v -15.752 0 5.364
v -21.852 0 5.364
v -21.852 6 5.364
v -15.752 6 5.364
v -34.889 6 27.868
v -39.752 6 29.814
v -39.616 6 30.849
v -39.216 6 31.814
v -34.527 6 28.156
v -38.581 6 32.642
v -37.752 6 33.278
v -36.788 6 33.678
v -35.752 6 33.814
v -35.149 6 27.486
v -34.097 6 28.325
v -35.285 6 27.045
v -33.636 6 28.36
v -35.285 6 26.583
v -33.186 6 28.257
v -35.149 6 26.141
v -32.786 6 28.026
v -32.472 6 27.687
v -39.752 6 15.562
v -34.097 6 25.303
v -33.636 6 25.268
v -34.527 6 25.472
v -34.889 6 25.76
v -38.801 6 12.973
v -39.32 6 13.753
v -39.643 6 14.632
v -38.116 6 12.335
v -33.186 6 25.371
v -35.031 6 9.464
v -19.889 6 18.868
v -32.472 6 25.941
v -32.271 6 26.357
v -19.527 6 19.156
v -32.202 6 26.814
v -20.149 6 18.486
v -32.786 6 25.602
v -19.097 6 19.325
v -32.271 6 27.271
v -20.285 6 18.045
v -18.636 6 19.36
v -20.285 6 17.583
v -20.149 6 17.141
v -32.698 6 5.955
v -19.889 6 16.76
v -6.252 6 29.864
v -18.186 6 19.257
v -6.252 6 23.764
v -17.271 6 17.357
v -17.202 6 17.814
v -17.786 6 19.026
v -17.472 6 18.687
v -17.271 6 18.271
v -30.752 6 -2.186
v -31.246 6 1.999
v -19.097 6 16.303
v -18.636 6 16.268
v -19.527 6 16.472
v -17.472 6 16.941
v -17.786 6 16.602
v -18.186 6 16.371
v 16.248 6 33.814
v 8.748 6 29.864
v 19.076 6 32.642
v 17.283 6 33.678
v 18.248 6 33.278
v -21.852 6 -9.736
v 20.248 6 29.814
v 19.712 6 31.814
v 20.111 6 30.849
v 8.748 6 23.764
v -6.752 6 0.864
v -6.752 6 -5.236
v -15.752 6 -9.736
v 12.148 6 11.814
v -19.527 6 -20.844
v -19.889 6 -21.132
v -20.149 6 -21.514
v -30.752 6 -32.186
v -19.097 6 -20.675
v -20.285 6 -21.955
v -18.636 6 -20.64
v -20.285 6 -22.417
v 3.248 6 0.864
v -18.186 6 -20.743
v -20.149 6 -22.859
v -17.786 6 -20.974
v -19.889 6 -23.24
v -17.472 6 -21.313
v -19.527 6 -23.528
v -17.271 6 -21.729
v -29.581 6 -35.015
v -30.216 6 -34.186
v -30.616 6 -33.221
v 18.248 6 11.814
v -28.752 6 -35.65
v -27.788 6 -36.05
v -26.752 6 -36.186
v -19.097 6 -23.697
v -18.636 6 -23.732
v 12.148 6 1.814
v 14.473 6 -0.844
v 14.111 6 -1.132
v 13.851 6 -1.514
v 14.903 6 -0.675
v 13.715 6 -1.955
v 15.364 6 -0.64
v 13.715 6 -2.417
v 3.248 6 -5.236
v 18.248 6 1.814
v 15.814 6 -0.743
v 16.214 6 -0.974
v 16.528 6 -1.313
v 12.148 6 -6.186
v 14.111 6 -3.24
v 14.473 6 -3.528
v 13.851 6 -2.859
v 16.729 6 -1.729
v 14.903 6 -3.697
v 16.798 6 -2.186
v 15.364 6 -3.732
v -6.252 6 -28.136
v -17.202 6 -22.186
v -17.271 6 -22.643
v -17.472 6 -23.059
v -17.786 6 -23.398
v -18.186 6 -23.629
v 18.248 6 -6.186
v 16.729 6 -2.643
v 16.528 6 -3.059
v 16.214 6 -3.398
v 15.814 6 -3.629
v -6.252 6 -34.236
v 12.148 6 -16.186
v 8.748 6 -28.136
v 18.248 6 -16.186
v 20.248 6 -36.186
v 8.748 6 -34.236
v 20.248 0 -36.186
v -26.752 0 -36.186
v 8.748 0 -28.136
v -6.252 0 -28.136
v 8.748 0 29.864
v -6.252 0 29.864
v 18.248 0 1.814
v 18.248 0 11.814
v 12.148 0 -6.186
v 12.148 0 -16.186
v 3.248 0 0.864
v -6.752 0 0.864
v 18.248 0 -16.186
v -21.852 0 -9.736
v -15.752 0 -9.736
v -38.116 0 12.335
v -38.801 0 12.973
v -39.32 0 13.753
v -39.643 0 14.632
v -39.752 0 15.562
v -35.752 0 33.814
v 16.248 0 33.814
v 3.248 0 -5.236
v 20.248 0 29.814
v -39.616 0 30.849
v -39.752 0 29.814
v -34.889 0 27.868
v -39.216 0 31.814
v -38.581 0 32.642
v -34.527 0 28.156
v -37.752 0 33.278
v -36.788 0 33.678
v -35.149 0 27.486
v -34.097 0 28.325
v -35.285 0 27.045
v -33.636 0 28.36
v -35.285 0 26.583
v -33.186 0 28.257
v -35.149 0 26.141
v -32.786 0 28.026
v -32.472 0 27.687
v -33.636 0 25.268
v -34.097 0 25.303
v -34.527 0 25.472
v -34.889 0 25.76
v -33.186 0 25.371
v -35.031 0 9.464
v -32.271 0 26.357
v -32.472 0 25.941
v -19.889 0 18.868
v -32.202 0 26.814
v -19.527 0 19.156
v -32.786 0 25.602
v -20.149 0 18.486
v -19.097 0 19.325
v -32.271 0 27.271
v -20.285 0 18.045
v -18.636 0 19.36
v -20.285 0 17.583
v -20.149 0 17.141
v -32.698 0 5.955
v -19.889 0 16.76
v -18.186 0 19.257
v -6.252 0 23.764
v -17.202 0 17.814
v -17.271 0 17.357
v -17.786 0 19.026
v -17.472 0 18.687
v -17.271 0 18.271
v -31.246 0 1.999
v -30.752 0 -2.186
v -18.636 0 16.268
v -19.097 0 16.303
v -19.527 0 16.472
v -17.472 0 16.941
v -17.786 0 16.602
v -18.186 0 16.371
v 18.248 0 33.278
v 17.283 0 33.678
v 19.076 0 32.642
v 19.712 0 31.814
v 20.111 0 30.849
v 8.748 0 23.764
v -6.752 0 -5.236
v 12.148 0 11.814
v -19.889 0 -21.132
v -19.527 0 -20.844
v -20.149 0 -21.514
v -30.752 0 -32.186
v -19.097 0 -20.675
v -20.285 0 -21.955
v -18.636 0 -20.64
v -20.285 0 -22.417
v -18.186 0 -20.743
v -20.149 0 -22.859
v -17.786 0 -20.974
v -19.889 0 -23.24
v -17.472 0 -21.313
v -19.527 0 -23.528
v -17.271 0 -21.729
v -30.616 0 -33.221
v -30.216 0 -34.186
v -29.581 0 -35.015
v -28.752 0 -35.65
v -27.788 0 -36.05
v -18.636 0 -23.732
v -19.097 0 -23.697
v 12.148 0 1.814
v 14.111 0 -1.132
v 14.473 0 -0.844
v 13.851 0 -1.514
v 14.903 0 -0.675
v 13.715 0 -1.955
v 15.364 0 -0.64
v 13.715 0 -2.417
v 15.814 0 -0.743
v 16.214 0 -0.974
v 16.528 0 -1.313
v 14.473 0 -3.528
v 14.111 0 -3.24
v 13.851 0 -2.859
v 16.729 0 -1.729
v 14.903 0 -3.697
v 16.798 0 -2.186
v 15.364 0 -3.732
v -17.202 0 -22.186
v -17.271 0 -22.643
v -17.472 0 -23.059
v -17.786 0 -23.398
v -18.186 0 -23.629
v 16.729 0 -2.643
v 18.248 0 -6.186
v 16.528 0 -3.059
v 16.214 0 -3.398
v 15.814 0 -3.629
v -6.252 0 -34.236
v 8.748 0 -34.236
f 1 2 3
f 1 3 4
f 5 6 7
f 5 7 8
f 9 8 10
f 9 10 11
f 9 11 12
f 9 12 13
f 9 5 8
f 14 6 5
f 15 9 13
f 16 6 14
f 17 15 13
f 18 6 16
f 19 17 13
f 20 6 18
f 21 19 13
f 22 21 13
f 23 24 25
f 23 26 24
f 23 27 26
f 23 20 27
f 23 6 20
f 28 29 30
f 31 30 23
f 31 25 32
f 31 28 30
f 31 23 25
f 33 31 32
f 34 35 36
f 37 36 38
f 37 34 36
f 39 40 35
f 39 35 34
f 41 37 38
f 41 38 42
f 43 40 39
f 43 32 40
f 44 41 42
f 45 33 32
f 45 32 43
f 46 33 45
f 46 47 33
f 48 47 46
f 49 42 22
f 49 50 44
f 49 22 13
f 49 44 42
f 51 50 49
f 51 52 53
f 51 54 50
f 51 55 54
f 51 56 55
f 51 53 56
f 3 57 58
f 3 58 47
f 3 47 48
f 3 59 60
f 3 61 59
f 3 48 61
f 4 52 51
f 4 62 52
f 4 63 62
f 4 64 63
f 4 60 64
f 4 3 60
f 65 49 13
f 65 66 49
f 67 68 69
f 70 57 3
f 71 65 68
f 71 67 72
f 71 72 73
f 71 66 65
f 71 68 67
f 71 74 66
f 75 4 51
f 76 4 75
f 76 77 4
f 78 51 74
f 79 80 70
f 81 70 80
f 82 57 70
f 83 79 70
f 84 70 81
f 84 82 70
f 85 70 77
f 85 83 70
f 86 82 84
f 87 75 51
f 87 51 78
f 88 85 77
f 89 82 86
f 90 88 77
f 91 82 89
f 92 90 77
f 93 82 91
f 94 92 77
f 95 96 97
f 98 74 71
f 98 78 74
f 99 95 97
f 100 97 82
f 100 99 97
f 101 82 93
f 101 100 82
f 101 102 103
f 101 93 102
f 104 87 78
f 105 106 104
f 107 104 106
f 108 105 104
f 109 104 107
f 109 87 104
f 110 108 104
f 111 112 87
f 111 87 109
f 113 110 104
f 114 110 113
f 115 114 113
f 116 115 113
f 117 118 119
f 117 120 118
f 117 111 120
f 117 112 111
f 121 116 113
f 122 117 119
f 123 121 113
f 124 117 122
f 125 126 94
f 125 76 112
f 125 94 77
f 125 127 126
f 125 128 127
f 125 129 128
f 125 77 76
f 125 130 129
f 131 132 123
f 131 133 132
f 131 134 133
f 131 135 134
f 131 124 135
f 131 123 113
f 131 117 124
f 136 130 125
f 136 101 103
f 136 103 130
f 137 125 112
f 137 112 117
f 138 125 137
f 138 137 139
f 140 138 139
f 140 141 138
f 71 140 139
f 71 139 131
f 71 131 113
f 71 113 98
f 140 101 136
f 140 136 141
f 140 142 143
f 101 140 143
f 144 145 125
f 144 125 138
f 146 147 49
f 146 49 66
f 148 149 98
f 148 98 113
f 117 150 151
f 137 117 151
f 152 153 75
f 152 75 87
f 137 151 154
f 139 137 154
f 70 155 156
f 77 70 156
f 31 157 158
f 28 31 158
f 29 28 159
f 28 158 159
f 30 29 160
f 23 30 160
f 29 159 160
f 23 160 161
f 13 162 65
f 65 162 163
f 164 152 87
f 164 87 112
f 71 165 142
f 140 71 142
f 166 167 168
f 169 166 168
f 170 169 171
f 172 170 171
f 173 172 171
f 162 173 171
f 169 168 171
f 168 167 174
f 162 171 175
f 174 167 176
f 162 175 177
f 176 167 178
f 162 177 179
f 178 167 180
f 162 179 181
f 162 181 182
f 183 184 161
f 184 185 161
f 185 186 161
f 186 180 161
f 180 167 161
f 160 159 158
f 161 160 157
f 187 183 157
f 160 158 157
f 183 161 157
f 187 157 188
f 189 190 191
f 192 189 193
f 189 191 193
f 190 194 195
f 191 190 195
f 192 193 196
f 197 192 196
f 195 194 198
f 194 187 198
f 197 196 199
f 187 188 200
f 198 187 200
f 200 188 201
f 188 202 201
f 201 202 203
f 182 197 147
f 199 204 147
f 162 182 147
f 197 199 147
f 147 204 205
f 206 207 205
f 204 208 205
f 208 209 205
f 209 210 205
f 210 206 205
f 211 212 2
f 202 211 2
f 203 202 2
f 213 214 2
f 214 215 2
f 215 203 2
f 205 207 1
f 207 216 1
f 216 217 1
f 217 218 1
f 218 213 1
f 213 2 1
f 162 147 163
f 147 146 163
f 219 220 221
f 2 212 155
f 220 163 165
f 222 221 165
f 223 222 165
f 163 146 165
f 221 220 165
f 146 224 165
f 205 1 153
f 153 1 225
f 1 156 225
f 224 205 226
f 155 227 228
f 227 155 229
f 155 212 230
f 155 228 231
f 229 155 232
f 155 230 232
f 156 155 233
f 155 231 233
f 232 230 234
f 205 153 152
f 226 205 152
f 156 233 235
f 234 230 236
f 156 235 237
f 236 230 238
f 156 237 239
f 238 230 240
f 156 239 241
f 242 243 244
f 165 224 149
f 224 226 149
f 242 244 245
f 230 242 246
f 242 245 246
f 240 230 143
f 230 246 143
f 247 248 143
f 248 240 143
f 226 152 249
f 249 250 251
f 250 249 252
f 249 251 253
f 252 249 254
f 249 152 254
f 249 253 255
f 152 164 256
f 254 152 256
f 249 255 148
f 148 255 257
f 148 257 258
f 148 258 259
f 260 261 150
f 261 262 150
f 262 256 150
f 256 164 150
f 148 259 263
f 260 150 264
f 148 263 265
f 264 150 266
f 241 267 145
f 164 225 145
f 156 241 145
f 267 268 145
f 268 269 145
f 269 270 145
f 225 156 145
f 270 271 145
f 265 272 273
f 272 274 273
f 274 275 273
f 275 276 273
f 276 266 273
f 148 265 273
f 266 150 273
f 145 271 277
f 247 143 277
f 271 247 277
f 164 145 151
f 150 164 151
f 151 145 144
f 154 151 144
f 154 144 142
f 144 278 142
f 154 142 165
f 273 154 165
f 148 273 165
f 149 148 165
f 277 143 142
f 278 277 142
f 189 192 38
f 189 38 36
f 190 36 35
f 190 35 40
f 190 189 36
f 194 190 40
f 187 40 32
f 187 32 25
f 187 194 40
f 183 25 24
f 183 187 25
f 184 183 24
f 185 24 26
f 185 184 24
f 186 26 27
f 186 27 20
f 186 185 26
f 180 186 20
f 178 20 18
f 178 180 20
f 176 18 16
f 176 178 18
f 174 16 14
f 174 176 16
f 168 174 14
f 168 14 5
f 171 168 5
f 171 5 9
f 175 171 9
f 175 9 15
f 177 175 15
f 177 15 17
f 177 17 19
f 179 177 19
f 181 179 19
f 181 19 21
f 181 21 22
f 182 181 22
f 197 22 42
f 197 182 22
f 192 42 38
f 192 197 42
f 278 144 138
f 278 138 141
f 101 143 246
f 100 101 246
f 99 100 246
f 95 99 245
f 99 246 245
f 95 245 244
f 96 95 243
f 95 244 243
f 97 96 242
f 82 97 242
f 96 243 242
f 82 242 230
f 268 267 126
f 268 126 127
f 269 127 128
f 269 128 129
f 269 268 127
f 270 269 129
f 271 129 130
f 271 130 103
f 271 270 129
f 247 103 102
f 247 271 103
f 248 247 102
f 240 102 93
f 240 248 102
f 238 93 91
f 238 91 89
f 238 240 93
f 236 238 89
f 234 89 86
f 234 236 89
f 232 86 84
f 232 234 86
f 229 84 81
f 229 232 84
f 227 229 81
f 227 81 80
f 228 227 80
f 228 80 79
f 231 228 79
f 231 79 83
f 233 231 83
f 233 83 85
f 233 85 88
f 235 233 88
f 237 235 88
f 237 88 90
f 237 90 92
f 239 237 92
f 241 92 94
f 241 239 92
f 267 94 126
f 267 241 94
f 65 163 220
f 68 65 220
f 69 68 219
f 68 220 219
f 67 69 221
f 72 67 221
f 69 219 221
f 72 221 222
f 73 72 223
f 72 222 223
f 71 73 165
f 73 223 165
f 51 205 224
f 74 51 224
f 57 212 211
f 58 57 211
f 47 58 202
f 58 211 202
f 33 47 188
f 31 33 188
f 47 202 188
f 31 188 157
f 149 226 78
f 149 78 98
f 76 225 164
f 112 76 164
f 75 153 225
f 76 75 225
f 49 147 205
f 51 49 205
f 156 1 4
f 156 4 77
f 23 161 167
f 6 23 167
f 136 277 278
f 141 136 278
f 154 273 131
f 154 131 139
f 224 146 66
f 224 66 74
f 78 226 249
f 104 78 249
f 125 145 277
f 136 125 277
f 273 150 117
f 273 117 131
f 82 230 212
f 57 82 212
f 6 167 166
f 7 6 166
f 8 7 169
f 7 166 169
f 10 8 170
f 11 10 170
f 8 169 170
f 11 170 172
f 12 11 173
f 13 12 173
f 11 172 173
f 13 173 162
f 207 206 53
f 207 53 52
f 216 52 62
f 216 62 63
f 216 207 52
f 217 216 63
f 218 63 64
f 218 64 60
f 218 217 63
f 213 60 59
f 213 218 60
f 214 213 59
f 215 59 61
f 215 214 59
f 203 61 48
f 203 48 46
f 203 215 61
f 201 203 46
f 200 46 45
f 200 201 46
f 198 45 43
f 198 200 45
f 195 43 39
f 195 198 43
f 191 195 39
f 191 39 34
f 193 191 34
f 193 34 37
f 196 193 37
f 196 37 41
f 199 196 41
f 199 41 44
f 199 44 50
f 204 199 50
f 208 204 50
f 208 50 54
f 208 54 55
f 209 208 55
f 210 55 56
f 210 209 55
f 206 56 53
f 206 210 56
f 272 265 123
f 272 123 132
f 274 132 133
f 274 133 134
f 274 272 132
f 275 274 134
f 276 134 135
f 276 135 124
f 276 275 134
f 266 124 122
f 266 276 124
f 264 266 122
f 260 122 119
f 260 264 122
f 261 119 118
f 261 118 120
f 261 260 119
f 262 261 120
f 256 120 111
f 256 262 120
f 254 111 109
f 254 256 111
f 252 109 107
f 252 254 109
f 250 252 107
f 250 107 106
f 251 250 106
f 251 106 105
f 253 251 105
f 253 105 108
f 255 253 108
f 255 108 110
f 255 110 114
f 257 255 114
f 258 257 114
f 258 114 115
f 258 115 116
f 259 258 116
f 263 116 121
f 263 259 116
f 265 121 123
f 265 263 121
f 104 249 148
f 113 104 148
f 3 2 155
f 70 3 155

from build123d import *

# Parameters (mm, degrees)
SKETCH_1_R      = 1.55
SKETCH_1_W      = 6.1
SKETCH_1_H      = 10
SKETCH_1_H_2    = 15.1
SKETCH_1_W_2    = 10
SKETCH_1_H_3    = 6.1
SKETCH_1_W_3    = 15
EXTRUDE_1_DEPTH = 6


with BuildPart() as part:
    # Эскиз1 → Бобышка-Вытянуть1 (new body)
    with BuildSketch(Plane(origin=(0, 0, 0), x_dir=(1, 0, 0), z_dir=(0, 1, 0))):
        with BuildLine():
            Line((-35.752327672, -33.813906094), (16.247672328, -33.813906094))
            ThreePointArc((16.247672328, -33.813906094), (19.076099452, -32.642333219), (20.247672328, -29.813906094))
            Line((20.247672328, -29.813906094), (20.247672328, 36.186093906))
            Line((20.247672328, 36.186093906), (-26.752327672, 36.186093906))
            ThreePointArc((-26.752327672, 36.186093906), (-29.580754797, 35.014521031), (-30.752327672, 32.186093906))
            Line((-30.752327672, 32.186093906), (-30.752327672, 2.186093906))
            ThreePointArc((-30.752327672, 2.186093906), (-32.698441142, -5.954712398), (-38.115964036, -12.335192834))
            ThreePointArc((-38.115964036, -12.335192834), (-39.319858012, -13.753077376), (-39.752327672, -15.562145443))
            Line((-39.752327672, -15.562145443), (-39.752327672, -29.813906094))
            ThreePointArc((-39.752327672, -29.813906094), (-38.580754797, -32.642333219), (-35.752327672, -33.813906094))
        make_face()
        with Locations((15.247672328, 2.186093906)):
            Circle(SKETCH_1_R, mode=Mode.SUBTRACT)
        with Locations((-18.752327672, -17.813906094)):
            Circle(SKETCH_1_R, mode=Mode.SUBTRACT)
        with Locations((-33.752327672, -26.813906094)):
            Circle(SKETCH_1_R, mode=Mode.SUBTRACT)
        with Locations((-18.752327672, 22.186093906)):
            Circle(SKETCH_1_R, mode=Mode.SUBTRACT)
        with Locations((15.197672328, 11.186093906)):
            Rectangle(SKETCH_1_W, SKETCH_1_H, mode=Mode.SUBTRACT)
        with Locations((-18.802327672, 2.186093906)):
            Rectangle(SKETCH_1_W, SKETCH_1_H_2, mode=Mode.SUBTRACT)
        with Locations((-1.752327672, 2.186093906)):
            Rectangle(SKETCH_1_W_2, SKETCH_1_H_3, mode=Mode.SUBTRACT)
        with Locations((15.197672328, -6.813906094)):
            Rectangle(SKETCH_1_W, SKETCH_1_H, mode=Mode.SUBTRACT)
        with Locations((1.247672328, 31.186093906)):
            Rectangle(SKETCH_1_W_3, SKETCH_1_H_3, mode=Mode.SUBTRACT)
        with Locations((1.247672328, -26.813906094)):
            Rectangle(SKETCH_1_W_3, SKETCH_1_H_3, mode=Mode.SUBTRACT)
    extrude(amount=EXTRUDE_1_DEPTH)


solid = part.part
